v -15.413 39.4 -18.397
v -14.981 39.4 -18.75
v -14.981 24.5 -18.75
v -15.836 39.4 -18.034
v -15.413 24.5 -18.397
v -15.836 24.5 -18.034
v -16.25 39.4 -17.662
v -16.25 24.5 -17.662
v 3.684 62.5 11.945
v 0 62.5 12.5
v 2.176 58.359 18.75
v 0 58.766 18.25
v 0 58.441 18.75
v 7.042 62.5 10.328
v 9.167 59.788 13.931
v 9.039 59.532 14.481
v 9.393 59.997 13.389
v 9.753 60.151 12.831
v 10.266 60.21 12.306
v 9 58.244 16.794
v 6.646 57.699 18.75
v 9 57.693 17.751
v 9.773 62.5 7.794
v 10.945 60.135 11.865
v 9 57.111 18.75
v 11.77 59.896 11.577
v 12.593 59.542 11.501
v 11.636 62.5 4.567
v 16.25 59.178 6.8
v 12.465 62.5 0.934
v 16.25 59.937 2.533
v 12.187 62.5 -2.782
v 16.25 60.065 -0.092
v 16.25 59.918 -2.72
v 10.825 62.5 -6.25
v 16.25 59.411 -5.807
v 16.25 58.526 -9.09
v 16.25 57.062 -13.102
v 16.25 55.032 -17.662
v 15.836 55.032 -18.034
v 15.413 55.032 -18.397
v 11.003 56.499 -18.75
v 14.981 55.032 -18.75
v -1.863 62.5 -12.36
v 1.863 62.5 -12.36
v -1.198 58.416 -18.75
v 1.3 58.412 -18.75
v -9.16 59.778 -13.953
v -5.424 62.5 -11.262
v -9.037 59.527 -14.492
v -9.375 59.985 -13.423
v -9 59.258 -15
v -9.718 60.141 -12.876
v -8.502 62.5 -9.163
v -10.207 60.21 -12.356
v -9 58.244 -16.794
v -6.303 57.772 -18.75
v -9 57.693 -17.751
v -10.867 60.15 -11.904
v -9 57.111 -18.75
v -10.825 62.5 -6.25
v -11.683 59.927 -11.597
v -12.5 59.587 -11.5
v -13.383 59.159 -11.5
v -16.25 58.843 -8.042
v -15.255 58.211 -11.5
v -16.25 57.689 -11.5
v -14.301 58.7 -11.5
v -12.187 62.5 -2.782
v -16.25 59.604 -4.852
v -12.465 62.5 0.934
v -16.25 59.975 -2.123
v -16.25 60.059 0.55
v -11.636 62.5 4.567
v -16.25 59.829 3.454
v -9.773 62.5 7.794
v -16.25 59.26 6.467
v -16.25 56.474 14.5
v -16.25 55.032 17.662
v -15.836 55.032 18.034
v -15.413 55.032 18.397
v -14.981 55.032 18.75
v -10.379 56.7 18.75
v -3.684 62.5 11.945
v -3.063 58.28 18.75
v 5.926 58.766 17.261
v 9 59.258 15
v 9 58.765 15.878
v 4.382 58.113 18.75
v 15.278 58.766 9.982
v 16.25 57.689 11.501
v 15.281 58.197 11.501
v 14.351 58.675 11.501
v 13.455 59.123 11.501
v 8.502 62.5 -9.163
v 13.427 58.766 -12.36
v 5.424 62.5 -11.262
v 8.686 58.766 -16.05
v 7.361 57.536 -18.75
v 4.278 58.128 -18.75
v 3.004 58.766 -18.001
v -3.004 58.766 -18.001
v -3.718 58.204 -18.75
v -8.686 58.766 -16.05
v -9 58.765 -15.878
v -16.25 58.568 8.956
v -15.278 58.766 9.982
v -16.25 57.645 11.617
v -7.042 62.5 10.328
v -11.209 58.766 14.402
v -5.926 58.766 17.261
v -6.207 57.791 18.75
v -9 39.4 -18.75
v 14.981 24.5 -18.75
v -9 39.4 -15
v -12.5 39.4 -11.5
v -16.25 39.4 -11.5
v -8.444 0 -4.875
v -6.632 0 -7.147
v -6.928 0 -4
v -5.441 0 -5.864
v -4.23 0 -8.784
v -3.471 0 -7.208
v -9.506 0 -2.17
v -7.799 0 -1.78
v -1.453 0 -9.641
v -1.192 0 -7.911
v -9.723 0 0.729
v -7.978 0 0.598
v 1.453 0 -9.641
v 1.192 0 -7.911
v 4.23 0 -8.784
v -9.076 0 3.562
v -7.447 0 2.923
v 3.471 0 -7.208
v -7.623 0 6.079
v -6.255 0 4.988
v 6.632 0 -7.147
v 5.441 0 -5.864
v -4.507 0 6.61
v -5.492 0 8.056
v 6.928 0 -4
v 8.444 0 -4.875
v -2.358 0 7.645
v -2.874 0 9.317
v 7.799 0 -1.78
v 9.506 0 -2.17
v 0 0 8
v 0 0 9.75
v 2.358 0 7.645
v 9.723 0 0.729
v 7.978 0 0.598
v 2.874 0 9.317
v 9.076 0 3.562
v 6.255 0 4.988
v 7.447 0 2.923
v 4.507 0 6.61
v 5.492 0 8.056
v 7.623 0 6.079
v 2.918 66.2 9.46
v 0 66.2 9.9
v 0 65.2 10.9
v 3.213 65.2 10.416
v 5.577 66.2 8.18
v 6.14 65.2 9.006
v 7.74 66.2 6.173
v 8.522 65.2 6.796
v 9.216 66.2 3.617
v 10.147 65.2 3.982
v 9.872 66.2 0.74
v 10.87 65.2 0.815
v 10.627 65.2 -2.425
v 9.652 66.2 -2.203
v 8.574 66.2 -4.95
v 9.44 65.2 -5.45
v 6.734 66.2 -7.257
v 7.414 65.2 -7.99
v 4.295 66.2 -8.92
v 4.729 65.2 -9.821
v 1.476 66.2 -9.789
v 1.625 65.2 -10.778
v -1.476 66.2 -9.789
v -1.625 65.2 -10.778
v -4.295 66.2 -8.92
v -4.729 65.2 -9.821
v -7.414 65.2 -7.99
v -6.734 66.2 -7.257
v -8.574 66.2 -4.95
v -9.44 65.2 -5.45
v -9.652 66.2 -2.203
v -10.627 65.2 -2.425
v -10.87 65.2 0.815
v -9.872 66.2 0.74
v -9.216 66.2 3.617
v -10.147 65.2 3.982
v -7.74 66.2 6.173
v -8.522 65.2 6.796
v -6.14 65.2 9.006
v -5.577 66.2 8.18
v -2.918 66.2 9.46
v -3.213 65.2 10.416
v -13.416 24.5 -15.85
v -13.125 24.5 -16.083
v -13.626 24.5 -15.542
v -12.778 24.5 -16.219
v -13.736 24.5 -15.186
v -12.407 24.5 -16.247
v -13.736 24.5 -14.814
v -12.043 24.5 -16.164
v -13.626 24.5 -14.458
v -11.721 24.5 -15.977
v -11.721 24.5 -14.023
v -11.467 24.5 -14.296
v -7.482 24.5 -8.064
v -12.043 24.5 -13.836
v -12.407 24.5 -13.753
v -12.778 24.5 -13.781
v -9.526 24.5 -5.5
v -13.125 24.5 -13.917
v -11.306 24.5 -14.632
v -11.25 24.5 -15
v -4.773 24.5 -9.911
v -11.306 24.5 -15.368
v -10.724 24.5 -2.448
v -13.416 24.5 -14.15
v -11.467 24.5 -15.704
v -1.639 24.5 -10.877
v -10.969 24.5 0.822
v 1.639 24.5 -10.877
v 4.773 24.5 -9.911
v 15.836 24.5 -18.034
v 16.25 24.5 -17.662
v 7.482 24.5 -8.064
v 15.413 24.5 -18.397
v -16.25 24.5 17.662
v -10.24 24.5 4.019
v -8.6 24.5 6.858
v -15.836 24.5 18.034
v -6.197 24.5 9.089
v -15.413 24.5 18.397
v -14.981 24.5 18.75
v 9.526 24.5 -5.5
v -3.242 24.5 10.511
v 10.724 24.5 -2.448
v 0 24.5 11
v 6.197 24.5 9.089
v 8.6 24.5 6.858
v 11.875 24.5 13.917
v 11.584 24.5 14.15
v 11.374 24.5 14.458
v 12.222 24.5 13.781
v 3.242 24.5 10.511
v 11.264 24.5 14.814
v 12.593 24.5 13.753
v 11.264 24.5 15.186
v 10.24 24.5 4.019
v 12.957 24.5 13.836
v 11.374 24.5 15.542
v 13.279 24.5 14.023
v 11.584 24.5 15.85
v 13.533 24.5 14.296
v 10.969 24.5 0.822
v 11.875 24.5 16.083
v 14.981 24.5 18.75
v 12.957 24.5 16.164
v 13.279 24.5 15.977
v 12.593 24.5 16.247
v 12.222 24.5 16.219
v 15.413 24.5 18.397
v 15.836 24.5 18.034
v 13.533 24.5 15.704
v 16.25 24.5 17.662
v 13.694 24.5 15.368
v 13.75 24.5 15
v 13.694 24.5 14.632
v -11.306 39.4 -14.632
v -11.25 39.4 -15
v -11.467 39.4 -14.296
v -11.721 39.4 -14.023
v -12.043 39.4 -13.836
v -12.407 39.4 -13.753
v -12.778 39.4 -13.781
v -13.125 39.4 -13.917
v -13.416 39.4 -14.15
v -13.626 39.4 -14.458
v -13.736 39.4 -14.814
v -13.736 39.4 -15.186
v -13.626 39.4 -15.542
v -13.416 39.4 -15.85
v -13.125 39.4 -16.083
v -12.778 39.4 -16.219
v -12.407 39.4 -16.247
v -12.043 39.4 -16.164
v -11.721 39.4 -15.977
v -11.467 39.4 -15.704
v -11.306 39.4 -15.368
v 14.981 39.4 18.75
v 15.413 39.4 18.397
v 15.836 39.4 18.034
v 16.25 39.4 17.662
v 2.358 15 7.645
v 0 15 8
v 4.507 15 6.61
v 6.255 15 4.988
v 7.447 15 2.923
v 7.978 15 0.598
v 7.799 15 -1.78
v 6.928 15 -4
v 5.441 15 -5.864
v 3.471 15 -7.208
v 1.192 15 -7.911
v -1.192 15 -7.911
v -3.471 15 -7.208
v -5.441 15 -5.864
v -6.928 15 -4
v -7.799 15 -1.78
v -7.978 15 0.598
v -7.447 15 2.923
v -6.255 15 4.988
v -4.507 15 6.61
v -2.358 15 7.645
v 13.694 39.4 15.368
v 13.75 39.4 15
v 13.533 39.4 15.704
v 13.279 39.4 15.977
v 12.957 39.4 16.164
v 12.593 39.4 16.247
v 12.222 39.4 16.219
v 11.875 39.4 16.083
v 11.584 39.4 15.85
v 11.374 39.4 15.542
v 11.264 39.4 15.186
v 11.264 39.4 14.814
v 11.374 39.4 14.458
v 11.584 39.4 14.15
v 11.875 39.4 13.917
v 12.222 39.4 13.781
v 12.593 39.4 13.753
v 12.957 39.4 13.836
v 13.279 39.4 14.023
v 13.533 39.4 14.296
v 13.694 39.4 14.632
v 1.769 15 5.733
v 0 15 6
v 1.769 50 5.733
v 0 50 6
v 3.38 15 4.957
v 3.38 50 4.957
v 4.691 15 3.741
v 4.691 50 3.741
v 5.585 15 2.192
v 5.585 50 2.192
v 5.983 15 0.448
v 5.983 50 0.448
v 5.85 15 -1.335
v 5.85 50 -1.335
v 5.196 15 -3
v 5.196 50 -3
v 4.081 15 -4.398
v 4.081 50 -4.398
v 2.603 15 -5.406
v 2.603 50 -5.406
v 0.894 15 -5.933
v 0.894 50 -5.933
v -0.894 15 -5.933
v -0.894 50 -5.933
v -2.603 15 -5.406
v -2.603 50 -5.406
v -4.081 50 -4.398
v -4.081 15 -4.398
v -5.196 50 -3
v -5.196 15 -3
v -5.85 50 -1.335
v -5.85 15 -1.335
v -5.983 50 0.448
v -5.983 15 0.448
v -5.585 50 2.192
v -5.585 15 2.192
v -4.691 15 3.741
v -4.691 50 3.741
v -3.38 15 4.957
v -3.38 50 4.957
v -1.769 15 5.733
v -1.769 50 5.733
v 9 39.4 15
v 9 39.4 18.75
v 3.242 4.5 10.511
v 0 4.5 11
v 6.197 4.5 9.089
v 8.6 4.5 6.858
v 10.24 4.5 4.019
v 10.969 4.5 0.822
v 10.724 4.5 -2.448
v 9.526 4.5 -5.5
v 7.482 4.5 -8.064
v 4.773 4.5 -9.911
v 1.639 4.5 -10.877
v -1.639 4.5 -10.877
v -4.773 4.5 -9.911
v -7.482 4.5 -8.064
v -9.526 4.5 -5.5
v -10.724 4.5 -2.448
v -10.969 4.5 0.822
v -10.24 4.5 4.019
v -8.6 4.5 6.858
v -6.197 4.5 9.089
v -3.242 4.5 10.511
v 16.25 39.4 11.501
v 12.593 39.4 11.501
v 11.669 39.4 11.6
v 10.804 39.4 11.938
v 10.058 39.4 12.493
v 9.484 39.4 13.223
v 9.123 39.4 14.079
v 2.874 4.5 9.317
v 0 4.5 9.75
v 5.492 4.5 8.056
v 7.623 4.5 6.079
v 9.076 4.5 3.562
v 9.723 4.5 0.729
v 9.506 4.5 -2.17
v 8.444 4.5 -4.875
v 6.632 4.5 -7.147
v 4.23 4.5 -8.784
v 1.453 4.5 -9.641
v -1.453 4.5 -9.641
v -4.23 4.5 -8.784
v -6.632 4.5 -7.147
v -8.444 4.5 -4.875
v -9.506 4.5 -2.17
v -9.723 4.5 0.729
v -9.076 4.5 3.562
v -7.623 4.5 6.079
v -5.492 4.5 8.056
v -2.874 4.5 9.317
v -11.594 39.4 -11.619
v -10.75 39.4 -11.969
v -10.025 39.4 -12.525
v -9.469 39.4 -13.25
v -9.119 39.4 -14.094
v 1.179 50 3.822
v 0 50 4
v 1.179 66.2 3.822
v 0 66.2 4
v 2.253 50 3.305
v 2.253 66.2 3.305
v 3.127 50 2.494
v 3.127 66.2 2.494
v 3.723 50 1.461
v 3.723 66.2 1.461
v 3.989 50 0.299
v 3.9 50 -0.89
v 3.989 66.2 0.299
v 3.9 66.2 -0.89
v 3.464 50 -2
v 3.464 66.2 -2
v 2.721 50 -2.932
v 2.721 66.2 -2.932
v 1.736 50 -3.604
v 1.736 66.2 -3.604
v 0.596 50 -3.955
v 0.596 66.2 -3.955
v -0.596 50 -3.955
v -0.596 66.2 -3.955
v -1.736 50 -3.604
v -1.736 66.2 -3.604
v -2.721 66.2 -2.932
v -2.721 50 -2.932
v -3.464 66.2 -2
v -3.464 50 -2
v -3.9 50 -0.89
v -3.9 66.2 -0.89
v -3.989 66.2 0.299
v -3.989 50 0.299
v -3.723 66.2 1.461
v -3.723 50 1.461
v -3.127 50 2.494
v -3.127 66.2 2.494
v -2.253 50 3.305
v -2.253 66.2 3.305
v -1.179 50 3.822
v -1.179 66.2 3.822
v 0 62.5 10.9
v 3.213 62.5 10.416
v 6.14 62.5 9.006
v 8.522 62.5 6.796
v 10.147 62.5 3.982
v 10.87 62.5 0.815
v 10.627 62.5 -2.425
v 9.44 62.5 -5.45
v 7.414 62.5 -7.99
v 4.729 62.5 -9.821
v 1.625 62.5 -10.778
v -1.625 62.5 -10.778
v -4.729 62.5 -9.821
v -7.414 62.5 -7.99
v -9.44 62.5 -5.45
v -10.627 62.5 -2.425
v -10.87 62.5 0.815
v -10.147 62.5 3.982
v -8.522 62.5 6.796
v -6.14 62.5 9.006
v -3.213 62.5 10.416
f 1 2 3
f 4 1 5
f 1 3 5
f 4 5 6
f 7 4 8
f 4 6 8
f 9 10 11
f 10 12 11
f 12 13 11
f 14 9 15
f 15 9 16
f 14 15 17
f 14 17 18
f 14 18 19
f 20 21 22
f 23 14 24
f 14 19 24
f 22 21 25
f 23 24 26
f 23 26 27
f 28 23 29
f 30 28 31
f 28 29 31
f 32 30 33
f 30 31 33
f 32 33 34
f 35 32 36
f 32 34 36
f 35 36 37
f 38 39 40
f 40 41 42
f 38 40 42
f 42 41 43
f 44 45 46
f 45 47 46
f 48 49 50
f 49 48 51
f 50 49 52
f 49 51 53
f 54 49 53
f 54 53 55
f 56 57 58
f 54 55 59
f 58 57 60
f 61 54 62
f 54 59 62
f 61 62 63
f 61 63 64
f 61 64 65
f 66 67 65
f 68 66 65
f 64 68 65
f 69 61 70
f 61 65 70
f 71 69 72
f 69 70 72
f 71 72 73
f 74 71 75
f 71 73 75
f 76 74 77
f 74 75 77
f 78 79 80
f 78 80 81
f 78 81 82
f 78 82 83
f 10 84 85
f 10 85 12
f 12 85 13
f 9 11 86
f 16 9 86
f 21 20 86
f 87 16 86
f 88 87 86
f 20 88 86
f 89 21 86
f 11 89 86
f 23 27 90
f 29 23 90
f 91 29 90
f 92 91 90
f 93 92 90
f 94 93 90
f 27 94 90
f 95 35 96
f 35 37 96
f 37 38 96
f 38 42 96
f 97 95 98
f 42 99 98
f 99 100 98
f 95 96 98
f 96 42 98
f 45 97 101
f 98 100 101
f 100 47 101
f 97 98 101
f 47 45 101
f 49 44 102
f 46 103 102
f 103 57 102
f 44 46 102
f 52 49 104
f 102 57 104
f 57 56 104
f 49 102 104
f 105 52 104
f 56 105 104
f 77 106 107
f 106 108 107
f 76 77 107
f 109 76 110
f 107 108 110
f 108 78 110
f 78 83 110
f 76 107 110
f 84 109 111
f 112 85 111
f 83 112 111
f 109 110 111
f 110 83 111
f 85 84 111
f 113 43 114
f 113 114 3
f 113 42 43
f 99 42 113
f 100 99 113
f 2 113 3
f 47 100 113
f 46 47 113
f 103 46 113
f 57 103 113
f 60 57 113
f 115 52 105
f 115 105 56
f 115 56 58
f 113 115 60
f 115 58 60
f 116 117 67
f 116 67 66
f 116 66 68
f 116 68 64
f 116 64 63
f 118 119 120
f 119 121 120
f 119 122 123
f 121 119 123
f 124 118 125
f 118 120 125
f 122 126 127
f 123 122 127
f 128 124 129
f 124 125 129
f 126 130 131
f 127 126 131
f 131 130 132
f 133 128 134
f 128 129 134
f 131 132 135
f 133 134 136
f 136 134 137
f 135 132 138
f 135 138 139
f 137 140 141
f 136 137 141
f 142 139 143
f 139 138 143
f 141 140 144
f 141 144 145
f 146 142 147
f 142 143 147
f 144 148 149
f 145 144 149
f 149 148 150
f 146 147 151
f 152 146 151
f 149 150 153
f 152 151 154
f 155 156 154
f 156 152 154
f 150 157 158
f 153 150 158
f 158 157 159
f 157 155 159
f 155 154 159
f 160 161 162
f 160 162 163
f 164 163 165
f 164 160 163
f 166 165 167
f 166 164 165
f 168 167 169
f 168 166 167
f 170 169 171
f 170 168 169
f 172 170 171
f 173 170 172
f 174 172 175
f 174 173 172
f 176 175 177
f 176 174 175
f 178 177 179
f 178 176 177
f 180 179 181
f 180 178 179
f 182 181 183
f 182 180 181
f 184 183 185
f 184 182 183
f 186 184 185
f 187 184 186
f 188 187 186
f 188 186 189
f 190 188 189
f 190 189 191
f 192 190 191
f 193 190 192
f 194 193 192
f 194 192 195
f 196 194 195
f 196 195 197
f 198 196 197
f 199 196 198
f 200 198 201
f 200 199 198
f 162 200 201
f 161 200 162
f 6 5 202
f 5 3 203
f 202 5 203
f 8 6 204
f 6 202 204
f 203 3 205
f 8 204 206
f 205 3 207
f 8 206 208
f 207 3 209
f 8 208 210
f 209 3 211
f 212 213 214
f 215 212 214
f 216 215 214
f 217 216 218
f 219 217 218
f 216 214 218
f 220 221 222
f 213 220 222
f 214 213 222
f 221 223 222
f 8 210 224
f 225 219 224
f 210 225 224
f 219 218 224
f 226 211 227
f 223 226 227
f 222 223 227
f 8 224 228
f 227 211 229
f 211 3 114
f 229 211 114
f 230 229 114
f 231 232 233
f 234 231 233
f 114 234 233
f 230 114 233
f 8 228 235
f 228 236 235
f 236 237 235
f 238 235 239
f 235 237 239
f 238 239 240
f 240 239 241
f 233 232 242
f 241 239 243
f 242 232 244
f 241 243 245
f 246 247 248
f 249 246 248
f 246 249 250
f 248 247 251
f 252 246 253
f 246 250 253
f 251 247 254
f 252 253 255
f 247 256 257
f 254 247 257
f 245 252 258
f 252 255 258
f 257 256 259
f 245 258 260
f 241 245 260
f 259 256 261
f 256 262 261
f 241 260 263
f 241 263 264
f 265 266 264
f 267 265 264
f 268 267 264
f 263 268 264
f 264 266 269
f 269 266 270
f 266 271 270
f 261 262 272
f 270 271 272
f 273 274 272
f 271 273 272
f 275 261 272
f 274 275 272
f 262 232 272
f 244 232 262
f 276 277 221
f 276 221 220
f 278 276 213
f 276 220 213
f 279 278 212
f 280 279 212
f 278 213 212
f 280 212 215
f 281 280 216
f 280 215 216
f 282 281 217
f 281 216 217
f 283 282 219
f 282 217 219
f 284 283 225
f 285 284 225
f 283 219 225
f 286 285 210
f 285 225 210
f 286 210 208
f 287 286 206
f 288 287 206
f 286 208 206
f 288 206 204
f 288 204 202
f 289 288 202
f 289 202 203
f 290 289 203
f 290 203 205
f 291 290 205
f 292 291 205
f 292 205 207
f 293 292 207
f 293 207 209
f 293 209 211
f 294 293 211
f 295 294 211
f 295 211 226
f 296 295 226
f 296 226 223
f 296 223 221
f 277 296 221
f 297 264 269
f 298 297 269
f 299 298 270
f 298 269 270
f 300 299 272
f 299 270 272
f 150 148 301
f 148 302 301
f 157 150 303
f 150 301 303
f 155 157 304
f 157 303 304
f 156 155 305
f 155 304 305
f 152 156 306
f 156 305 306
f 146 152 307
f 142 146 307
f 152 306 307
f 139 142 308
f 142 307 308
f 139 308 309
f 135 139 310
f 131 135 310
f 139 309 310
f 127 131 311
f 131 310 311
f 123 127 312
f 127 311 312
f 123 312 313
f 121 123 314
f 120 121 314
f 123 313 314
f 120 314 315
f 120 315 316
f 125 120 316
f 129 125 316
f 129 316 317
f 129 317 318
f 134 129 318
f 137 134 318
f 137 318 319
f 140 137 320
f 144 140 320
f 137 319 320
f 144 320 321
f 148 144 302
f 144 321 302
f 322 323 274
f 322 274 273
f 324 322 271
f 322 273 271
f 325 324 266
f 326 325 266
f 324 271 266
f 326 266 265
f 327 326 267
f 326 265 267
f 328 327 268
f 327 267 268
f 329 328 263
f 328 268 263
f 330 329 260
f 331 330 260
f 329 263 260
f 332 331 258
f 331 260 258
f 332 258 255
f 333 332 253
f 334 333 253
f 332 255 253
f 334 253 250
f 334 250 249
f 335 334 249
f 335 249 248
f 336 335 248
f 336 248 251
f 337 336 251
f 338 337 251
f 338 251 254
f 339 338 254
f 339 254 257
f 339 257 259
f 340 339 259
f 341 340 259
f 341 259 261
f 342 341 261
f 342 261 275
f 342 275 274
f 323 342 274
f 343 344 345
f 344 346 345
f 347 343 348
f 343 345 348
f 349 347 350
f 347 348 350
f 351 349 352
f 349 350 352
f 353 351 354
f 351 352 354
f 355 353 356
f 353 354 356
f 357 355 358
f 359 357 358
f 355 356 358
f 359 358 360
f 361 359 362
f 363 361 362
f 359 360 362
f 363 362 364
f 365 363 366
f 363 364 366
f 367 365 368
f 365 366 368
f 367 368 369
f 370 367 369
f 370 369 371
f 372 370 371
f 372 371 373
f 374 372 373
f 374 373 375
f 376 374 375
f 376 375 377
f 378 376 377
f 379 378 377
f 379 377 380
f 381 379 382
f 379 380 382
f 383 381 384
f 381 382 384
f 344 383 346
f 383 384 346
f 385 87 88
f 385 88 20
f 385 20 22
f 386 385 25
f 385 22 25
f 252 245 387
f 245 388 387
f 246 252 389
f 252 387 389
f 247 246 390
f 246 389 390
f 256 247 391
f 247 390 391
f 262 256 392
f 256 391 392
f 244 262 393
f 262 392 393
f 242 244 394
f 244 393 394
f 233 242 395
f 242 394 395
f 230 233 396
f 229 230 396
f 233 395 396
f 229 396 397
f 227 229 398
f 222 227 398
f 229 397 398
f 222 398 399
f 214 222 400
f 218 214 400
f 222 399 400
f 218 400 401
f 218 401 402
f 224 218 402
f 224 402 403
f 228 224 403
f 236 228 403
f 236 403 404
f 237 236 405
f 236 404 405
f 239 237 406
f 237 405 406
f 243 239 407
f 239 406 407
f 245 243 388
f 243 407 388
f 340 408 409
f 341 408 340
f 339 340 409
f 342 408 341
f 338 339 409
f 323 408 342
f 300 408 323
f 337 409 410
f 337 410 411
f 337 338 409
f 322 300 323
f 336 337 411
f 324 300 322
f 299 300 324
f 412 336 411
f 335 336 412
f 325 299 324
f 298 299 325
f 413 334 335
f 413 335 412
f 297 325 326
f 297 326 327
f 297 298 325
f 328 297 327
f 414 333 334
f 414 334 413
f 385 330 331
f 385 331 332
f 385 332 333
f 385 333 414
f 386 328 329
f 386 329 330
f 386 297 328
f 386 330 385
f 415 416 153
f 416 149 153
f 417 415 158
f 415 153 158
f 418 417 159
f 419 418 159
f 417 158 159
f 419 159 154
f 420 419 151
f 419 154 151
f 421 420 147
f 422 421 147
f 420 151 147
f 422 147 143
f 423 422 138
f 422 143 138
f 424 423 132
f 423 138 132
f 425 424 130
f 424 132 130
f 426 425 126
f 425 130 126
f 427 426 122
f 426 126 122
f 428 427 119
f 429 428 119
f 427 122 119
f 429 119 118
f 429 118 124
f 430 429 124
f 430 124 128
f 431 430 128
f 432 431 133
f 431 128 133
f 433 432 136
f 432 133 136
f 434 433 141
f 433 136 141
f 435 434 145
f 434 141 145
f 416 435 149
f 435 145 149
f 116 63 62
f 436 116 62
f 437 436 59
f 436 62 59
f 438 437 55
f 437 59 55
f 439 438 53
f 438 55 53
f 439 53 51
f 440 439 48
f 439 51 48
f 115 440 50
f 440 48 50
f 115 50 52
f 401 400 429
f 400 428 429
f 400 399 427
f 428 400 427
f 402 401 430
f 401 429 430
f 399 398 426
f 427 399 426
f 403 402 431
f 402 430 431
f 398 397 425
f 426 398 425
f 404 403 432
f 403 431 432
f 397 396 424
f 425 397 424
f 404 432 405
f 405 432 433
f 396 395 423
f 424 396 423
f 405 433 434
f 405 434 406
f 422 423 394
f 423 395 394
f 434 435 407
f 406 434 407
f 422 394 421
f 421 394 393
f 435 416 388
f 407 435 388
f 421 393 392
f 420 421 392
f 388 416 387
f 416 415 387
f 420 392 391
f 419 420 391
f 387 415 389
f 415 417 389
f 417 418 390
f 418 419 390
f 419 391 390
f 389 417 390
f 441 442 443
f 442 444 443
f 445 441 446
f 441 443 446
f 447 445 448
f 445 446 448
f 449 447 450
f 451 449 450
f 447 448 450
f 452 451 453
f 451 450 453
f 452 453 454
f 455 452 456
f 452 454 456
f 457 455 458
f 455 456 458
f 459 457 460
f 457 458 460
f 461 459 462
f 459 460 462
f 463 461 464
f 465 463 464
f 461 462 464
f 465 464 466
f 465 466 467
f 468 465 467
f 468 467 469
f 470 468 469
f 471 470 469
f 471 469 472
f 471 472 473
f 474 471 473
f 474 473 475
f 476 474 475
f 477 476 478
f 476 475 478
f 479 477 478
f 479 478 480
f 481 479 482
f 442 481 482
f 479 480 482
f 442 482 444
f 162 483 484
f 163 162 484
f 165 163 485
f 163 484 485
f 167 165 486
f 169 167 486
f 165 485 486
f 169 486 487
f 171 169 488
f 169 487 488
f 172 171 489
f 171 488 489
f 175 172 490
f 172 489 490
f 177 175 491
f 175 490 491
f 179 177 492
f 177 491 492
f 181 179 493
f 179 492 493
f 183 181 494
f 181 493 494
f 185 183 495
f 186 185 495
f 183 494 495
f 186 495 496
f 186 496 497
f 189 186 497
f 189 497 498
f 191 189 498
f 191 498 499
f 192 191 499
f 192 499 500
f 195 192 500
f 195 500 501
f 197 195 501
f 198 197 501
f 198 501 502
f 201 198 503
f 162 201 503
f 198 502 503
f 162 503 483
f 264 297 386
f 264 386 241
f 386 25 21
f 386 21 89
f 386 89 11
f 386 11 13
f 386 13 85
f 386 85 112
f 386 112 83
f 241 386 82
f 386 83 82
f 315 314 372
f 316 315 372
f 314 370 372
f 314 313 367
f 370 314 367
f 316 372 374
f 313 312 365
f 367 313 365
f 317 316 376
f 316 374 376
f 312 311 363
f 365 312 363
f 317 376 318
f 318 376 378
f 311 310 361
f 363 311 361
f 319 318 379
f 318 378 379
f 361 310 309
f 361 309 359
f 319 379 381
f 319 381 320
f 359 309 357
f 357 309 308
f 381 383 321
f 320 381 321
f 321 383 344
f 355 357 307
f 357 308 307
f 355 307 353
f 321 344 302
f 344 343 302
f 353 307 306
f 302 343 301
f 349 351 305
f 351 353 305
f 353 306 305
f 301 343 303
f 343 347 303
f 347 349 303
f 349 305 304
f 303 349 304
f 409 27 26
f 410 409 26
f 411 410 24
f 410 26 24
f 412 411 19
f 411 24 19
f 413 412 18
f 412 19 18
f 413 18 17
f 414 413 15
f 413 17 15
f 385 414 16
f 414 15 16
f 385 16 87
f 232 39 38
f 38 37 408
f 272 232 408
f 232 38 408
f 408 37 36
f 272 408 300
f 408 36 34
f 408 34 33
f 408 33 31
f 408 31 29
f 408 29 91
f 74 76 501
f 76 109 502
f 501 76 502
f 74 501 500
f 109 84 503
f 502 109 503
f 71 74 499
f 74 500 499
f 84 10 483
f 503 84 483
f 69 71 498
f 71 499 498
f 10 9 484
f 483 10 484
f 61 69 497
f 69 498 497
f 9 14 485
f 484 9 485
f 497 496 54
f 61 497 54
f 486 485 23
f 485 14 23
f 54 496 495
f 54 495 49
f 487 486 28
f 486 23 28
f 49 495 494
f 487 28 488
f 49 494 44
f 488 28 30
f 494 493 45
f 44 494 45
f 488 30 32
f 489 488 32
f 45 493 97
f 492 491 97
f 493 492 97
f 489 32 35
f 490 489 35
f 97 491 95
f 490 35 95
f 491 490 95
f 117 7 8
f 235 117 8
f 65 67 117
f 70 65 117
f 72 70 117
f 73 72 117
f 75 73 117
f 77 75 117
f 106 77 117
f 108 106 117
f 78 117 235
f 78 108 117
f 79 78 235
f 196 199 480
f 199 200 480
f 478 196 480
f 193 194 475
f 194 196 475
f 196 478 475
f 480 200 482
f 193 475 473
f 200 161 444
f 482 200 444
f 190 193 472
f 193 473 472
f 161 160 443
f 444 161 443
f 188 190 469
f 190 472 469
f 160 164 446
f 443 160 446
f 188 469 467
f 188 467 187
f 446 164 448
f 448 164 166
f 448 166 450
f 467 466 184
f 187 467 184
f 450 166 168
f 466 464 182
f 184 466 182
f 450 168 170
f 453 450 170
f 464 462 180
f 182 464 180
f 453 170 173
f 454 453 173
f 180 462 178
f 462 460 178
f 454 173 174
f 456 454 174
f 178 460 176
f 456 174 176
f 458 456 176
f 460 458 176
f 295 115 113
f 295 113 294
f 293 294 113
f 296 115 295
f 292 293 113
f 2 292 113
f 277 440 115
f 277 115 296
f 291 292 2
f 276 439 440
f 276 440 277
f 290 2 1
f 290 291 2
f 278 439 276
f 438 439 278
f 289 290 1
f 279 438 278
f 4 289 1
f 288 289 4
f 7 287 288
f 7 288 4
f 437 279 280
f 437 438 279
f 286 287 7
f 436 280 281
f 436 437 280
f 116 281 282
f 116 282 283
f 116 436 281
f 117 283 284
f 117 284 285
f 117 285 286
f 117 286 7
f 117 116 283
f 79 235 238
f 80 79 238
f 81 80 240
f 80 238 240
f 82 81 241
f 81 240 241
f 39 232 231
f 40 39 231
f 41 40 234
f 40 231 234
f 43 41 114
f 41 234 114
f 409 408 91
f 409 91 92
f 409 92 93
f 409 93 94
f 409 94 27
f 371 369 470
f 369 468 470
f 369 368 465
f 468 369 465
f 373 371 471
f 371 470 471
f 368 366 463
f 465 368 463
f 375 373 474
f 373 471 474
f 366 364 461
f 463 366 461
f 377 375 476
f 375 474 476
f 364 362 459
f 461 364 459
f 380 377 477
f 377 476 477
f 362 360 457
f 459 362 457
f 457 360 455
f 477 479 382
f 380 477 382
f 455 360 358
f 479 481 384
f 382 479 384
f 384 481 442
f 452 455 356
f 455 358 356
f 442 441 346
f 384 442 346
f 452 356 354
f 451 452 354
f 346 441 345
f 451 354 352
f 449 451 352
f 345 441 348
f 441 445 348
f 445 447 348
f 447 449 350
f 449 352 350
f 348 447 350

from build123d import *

# Parameters (mm, degrees)
F2_W     = 79.127467
F2_H     = 78.408126
F2_W_2   = 32.5
F2_H_2   = 37.5
F3_DEPTH = 66.201
F5_DEPTH = 26.8
F7_D     = 2.5
F7_DEPTH = 50
F8_SIZE  = 1


with BuildPart() as f1:
    # F0 (on Right) → F1 (revolve)
    with BuildSketch(Plane.YZ):
        Polygon((24.5, 11), (4.5, 11), (4.5, 9.75), (0, 9.75), (0, 8), (15, 8), (15, 6), (50, 6), (50, 4), (66.2, 4), (66.2, 10.9), (62.5, 10.9), (62.5, 12.5), (55.031813, 24), (24.5, 24), align=None)
    revolve(axis=Axis((0, 44.76735, 0), (0, 1, 0)))

    # F2 (on face) → F3 (cut, through all)
    with BuildSketch(Plane(origin=(0, 66.2, 0), x_dir=(-1, 0, 0), z_dir=(0, 1, 0))):
        with Locations((1.602461, -2.474608)):
            Rectangle(F2_W, F2_H)
        Rectangle(F2_W_2, F2_H_2, mode=Mode.SUBTRACT)
    extrude(amount=-F3_DEPTH, mode=Mode.SUBTRACT)

    # F4 (on face) → F5 (cut)
    with BuildSketch(Plane(origin=(0, 66.2, 0), x_dir=(-1, 0, 0), z_dir=(0, 1, 0))):
        with BuildLine():
            Line((-18, 11.501228), (-12.592719, 11.501228))
            ThreePointArc((-12.592719, 11.501228), (-10.058127, 12.492559), (-9, 15))
            Line((-9, 15), (-9, 21))
            Line((-9, 21), (-18, 21))
            Line((-18, 21), (-18, 11.501228))
        make_face()
        with BuildLine():
            Line((18, -11.5), (12.5, -11.5))
            ThreePointArc((12.5, -11.5), (10.025126, -12.525126), (9, -15))
            Line((9, -15), (9, -21))
            Line((9, -21), (18, -21))
            Line((18, -21), (18, -11.5))
        make_face()
    extrude(amount=-F5_DEPTH, mode=Mode.SUBTRACT)

    # F7
    with Locations(Plane(origin=(0, 39.4, 0), x_dir=(-1, 0, 0), z_dir=(0, 1, 0))):
        with Locations((-12.5, 15), (12.5, -15)):
            Hole(F7_D / 2, depth=F7_DEPTH)

    # F8
    f8_edges = [f1.edges().sort_by_distance(p)[0] for p in [
        (0, 66.2, -10.9),
    ]]
    chamfer(f8_edges, length=F8_SIZE)


solid = f1.part
